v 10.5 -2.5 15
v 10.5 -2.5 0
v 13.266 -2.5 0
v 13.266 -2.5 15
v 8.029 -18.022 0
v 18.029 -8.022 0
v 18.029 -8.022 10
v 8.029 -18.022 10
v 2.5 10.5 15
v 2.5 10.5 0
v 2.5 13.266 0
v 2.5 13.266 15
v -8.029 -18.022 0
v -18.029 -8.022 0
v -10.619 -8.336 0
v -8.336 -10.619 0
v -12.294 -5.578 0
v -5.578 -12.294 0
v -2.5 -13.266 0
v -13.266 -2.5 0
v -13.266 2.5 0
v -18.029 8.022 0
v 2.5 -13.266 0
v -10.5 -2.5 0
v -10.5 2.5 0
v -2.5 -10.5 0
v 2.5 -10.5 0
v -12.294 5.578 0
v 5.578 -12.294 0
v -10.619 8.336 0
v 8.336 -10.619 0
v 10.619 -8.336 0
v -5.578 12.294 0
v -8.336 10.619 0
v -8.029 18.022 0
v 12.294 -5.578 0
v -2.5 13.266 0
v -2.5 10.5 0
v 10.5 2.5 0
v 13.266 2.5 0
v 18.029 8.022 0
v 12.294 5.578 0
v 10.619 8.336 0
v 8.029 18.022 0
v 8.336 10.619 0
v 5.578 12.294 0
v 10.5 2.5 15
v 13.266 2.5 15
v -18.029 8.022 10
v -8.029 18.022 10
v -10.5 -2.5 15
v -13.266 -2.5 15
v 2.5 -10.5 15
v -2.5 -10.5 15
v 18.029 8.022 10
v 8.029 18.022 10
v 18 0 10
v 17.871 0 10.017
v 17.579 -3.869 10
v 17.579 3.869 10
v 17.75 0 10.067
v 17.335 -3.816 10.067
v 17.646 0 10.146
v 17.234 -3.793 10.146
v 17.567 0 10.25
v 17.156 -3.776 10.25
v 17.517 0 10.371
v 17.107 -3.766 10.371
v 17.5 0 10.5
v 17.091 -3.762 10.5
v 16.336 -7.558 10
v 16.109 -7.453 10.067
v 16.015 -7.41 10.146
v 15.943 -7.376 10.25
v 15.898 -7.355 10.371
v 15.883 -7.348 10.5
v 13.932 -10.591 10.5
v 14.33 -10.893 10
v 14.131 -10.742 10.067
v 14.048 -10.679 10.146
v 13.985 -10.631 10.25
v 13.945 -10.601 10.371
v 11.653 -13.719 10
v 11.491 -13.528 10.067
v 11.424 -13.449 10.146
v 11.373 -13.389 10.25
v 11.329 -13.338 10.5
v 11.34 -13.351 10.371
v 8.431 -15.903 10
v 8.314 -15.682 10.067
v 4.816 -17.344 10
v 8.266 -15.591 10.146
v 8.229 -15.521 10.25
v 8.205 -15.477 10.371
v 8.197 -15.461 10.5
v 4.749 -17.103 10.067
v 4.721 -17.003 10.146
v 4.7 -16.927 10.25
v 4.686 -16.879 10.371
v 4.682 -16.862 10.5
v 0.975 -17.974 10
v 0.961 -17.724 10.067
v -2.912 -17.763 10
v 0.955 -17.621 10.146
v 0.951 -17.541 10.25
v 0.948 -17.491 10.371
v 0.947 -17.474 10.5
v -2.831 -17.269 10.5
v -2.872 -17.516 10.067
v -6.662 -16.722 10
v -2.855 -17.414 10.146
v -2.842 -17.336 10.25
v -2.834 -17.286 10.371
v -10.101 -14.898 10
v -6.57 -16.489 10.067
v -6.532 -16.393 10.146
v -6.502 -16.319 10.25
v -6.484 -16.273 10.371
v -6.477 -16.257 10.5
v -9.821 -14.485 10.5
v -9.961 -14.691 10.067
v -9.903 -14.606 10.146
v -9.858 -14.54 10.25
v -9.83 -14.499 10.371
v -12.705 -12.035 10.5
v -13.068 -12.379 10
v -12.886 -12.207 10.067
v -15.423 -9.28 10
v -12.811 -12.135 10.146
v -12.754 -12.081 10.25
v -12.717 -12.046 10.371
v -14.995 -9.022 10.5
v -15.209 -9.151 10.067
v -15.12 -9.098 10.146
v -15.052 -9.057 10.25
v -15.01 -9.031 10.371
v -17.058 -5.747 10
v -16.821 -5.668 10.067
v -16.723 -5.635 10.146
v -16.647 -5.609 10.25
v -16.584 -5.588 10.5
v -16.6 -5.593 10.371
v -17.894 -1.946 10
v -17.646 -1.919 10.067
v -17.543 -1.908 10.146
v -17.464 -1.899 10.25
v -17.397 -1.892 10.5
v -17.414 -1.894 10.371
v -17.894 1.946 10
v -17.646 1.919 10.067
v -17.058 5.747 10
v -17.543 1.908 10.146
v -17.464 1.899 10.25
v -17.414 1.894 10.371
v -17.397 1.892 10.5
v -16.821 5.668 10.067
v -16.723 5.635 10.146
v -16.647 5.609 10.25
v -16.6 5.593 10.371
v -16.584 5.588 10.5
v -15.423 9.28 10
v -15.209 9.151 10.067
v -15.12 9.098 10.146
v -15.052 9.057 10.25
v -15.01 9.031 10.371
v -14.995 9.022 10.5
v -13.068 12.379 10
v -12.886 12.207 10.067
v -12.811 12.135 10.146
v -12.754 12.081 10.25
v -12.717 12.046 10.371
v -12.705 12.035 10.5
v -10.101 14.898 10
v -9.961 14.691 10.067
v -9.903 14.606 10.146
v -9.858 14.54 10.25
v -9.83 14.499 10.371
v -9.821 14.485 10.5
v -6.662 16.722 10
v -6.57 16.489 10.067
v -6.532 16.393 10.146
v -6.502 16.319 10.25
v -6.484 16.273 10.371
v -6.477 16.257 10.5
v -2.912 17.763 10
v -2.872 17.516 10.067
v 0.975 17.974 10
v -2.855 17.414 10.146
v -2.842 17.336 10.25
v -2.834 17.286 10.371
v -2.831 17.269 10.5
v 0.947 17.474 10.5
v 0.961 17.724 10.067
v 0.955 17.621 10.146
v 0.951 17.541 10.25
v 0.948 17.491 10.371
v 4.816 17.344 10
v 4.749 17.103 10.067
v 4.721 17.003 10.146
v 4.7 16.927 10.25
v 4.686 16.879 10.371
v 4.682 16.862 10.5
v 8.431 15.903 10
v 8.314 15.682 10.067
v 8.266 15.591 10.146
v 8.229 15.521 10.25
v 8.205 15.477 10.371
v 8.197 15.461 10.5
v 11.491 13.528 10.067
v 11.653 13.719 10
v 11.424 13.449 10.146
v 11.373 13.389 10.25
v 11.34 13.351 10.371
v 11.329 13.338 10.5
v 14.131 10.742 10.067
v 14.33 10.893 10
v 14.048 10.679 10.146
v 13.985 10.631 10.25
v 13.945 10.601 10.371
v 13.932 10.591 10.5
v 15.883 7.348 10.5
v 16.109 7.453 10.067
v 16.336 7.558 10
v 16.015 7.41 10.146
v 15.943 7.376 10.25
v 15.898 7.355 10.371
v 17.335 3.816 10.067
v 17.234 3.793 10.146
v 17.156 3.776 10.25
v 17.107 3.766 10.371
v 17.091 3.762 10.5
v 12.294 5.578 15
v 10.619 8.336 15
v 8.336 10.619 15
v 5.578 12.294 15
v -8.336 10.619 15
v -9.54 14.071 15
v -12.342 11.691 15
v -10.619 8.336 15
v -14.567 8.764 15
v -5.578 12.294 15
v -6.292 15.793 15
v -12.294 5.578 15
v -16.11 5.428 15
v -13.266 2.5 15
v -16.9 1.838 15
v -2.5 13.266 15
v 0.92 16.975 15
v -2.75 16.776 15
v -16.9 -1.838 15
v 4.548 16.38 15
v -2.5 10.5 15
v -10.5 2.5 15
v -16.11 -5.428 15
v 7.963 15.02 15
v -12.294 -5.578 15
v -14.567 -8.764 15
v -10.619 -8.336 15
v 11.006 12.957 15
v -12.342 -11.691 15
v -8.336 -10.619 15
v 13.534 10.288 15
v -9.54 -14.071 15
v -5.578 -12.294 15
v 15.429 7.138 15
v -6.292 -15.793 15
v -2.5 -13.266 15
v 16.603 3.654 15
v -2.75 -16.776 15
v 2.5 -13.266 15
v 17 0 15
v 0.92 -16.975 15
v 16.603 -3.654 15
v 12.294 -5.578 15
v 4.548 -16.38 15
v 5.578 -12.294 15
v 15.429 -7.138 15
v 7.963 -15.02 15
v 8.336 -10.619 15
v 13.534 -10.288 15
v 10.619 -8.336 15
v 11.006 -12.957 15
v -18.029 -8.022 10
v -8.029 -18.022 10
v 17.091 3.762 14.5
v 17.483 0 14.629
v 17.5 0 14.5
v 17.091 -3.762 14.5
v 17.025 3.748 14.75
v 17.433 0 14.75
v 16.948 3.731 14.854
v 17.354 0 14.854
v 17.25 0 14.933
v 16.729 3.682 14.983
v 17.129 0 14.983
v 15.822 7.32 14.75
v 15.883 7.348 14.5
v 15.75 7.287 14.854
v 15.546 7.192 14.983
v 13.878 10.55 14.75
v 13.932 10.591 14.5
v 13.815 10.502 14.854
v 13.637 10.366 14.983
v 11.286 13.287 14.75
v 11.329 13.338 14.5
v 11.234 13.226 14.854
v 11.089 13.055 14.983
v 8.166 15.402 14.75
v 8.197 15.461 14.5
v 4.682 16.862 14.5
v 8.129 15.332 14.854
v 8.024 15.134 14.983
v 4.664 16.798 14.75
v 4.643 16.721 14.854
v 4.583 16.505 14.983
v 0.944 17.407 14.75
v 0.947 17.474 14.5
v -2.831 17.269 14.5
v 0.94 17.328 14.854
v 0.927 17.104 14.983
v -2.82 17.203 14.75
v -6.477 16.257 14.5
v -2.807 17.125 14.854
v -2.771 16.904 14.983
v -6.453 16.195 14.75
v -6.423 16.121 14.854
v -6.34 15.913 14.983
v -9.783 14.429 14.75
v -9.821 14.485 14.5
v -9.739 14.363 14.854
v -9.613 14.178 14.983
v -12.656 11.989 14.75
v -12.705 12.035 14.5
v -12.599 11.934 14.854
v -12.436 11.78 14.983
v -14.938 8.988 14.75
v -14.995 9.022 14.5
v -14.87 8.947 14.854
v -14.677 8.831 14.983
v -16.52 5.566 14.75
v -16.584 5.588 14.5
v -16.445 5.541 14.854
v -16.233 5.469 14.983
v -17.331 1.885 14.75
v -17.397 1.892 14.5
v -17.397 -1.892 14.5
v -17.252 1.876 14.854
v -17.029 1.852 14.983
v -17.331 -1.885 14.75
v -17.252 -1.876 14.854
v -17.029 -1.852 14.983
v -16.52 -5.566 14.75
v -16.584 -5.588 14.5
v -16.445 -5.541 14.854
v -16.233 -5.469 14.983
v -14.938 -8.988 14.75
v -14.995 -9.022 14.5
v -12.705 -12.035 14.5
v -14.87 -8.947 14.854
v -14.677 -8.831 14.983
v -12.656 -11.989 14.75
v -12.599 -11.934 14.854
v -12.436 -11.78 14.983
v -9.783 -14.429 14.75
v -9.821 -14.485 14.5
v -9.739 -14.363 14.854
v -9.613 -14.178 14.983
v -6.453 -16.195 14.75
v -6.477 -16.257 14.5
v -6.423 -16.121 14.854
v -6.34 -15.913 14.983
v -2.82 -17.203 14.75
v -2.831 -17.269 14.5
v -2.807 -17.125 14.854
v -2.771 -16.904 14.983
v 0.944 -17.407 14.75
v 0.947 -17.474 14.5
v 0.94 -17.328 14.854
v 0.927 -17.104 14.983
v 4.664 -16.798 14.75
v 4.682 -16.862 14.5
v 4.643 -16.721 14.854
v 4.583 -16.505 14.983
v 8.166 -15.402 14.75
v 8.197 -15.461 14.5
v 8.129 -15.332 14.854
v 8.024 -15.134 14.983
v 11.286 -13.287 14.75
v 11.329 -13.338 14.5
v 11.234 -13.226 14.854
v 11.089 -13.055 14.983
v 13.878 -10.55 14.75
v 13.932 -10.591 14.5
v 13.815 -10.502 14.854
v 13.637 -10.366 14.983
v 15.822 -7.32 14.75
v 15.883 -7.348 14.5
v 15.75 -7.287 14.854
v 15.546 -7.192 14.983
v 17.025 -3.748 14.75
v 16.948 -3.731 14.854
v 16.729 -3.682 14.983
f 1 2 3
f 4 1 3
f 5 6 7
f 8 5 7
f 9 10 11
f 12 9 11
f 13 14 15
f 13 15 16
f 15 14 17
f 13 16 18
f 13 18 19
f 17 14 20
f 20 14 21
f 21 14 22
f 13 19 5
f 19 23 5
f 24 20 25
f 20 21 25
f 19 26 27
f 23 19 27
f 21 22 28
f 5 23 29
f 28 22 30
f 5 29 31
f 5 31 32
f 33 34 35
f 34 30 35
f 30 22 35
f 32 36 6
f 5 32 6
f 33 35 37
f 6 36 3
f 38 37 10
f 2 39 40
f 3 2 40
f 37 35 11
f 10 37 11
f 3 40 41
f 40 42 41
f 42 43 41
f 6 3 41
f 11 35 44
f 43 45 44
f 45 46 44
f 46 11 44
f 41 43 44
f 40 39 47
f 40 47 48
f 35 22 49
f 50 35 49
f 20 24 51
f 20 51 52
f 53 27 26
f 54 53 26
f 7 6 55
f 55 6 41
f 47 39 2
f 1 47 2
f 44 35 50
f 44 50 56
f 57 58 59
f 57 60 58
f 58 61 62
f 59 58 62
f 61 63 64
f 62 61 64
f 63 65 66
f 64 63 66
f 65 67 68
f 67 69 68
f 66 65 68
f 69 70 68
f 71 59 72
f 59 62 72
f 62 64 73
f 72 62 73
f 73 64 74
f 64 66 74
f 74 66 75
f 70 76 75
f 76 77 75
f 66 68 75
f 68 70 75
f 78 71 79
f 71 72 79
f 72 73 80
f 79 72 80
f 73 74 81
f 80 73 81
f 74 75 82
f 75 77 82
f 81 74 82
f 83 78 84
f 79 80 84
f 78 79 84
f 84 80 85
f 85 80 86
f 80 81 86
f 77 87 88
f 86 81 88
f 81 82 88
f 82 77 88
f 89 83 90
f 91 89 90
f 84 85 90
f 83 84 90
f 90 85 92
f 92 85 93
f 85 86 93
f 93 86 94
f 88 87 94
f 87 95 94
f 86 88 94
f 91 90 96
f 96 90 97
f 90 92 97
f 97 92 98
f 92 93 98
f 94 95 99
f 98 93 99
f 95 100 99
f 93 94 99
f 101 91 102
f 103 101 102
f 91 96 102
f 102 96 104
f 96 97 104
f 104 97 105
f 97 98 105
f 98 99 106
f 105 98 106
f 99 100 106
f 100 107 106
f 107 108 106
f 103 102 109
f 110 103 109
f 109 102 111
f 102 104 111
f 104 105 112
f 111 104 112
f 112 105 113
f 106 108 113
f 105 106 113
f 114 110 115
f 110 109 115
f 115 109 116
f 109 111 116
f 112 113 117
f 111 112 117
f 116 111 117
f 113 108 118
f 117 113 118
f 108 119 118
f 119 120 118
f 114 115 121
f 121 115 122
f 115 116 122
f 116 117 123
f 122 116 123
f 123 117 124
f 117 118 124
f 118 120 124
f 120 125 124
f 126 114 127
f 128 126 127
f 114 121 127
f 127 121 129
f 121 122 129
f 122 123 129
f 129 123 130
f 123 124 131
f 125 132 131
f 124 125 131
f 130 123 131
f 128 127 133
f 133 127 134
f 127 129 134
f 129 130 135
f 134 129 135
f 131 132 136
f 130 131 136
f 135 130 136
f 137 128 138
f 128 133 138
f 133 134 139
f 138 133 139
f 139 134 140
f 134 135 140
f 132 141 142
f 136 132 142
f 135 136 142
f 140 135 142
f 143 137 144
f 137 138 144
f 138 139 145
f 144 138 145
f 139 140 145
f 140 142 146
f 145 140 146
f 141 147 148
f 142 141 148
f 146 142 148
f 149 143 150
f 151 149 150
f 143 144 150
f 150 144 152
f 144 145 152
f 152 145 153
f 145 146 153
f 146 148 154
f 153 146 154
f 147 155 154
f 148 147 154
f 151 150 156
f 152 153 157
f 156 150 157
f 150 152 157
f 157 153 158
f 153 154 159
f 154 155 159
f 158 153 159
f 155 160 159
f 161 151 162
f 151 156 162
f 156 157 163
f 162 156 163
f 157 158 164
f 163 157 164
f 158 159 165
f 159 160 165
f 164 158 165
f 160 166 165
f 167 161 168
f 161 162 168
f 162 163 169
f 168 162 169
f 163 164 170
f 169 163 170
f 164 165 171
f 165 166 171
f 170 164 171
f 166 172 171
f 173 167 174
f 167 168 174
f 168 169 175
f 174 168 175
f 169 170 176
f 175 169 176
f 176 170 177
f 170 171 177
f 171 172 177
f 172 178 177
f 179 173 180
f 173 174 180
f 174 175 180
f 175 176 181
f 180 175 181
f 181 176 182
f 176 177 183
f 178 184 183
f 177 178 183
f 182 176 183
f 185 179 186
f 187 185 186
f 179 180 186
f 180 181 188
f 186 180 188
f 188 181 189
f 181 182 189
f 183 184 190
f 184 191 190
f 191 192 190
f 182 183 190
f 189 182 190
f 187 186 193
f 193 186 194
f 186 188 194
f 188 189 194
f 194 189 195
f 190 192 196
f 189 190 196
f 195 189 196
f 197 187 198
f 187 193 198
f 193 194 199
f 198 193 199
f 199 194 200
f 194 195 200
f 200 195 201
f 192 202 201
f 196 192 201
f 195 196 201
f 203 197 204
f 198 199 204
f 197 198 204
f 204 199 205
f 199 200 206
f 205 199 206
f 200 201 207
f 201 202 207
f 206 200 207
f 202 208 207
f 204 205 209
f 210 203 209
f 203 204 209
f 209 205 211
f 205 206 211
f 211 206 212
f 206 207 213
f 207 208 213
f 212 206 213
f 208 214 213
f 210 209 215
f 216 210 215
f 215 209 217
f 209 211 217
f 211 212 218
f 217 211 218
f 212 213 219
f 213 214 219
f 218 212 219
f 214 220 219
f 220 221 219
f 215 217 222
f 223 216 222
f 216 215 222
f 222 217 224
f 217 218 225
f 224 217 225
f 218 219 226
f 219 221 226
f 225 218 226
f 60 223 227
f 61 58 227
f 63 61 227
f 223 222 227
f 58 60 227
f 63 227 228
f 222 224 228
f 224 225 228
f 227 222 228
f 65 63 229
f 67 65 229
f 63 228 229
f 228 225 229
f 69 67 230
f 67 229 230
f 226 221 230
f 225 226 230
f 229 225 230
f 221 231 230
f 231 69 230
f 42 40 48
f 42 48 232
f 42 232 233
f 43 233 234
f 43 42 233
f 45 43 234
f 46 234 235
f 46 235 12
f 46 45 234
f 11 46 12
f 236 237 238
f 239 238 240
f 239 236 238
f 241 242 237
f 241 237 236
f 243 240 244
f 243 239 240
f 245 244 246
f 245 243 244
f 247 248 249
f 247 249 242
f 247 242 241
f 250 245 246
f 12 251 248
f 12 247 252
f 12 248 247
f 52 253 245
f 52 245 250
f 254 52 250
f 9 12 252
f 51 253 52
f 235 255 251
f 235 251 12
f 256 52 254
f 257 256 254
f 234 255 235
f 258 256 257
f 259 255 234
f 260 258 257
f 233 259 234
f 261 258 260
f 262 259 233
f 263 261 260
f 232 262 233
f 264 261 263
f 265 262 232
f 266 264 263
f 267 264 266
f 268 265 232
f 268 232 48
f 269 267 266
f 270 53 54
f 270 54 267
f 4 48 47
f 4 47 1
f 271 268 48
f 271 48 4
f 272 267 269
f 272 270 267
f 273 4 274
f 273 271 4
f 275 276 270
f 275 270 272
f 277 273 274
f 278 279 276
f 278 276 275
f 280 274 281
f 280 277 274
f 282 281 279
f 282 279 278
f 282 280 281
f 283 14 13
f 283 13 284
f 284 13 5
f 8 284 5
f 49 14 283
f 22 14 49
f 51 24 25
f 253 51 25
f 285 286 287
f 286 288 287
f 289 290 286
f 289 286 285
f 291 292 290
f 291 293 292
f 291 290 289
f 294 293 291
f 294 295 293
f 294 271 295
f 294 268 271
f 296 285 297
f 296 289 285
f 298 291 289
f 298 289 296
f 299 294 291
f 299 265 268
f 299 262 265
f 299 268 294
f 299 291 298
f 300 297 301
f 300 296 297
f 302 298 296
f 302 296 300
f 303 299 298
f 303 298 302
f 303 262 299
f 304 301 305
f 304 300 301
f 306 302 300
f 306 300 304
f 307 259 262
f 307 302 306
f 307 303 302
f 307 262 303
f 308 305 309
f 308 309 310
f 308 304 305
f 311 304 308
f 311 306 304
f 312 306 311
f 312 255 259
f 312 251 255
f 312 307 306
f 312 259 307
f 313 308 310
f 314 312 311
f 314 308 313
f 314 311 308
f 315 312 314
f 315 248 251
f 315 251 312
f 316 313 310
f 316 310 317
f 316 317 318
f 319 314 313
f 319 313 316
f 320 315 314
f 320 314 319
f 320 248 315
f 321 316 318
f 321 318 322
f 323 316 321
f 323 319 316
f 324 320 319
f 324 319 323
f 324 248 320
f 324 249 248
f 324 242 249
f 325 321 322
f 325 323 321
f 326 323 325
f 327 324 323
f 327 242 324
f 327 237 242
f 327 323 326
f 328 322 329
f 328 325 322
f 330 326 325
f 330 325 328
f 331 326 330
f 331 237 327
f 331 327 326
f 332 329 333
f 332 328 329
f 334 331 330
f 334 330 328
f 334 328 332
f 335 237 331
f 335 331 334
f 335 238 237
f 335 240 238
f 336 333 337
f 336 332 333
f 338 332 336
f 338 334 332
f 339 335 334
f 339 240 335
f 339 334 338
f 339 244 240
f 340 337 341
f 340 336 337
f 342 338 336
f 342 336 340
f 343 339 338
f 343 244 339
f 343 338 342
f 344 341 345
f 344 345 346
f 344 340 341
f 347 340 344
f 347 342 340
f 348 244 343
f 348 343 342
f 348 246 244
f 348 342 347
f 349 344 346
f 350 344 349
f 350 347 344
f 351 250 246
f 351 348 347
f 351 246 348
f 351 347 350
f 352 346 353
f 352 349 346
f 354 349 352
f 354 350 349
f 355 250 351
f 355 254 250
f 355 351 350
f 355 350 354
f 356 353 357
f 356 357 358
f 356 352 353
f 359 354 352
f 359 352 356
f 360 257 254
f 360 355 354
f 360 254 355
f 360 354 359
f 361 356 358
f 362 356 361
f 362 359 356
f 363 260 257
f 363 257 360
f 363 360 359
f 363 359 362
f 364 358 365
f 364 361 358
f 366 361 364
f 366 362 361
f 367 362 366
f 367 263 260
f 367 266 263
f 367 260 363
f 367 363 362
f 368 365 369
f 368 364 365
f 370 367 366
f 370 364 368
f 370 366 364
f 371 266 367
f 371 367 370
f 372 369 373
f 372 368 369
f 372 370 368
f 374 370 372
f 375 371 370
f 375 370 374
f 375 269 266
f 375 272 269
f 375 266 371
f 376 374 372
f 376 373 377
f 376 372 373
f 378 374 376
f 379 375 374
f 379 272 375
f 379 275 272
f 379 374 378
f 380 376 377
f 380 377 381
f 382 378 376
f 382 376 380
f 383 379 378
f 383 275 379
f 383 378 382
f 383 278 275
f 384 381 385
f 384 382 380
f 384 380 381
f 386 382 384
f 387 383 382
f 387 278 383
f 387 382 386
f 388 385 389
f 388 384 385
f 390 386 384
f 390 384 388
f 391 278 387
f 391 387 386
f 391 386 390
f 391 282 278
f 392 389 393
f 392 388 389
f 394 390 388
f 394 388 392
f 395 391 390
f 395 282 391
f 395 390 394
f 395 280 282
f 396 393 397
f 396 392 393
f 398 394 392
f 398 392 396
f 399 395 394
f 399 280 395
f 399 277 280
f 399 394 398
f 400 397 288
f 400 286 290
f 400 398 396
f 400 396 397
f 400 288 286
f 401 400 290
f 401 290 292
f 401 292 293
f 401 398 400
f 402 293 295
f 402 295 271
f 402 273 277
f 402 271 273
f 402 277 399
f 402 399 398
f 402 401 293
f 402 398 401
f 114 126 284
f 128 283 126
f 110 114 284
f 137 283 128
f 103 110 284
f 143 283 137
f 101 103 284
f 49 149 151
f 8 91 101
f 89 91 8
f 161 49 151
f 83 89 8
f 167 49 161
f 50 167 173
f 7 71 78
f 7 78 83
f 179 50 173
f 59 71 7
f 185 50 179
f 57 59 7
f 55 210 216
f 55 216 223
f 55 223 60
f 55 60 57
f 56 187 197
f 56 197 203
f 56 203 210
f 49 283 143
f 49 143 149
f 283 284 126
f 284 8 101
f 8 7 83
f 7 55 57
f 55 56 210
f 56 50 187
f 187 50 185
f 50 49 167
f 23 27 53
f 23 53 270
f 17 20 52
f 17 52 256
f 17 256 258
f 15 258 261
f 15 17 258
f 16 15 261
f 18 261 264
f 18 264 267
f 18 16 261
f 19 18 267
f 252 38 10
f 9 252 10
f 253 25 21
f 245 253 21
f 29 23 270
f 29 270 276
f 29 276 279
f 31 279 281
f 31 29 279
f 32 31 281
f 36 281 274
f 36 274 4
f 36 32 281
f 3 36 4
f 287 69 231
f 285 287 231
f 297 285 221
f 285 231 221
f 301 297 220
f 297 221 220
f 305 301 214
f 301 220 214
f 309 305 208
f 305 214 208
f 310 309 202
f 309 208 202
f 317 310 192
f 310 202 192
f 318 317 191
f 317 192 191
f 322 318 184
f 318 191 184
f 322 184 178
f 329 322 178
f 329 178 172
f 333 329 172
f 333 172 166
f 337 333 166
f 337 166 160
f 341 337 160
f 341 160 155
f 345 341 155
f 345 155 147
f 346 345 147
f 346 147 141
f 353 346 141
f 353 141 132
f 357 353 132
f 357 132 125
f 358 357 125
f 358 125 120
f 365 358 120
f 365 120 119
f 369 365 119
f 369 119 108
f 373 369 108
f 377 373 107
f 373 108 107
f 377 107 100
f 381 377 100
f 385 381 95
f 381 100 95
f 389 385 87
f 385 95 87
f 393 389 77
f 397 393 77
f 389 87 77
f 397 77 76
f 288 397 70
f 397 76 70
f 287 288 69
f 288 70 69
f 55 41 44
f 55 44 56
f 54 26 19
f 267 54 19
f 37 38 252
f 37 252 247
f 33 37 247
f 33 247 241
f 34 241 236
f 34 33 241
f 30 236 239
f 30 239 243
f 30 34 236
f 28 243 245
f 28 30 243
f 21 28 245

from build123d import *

# Parameters (mm, degrees)
F1_R     = 17.5
F1_R_2   = 13.5
F2_DEPTH = 15
F4_W     = 5
F4_H     = 3.8615576923
F5_DEPTH = 15
F6_COUNT = 4
F7_W     = 36.0574051738
F7_H     = 36.043446511
F7_R     = 13.5
F8_DEPTH = 10
F9_SIZE  = 10
F10_R    = 0.5
F11_R    = 0.5


with BuildPart() as f2:
    # F1 (on face) → F2 (new body)
    with BuildSketch(Plane.XY):
        Circle(F1_R)
        Circle(F1_R_2, mode=Mode.SUBTRACT)
    extrude(amount=F2_DEPTH)

    # F4 (on Top) → F5 (join)
    with BuildSketch(Plane.XY):
        with Locations((0, 12.4307788461)):
            Rectangle(F4_W, F4_H)
    extrude(amount=F5_DEPTH)

    # F6: F2 ×4 about axis
    f6_axis = Axis((0, 0, 0), (0, 0, 1))


with BuildPart() as f2_1:
    add(f2.part)
    for i in range(1, F6_COUNT):
        add(f2.part.rotate(f6_axis, i * 360 / F6_COUNT))

    # F7 (on face) → F8 (join)
    with BuildSketch(Plane.XY):
        Rectangle(F7_W, F7_H)
        Circle(F7_R, mode=Mode.SUBTRACT)
    extrude(amount=F8_DEPTH)

    # F9
    f9_edges = [f2_1.edges().sort_by_distance(p)[0] for p in [
        (18.028703, 18.021723, 5),
        (-18.028703, 18.021723, 5),
        (-18.028703, -18.021723, 5),
        (18.028703, -18.021723, 5),
    ]]
    chamfer(f9_edges, length=F9_SIZE)

    # F10
    f10_edges = [f2_1.edges().sort_by_distance(p)[0] for p in [
        (-17.5, 0, 10),
    ]]
    fillet(f10_edges, radius=F10_R)

    # F11
    f11_edges = [f2_1.edges().sort_by_distance(p)[0] for p in [
        (-17.5, 0, 15),
    ]]
    fillet(f11_edges, radius=F11_R)


solid = f2_1.part
